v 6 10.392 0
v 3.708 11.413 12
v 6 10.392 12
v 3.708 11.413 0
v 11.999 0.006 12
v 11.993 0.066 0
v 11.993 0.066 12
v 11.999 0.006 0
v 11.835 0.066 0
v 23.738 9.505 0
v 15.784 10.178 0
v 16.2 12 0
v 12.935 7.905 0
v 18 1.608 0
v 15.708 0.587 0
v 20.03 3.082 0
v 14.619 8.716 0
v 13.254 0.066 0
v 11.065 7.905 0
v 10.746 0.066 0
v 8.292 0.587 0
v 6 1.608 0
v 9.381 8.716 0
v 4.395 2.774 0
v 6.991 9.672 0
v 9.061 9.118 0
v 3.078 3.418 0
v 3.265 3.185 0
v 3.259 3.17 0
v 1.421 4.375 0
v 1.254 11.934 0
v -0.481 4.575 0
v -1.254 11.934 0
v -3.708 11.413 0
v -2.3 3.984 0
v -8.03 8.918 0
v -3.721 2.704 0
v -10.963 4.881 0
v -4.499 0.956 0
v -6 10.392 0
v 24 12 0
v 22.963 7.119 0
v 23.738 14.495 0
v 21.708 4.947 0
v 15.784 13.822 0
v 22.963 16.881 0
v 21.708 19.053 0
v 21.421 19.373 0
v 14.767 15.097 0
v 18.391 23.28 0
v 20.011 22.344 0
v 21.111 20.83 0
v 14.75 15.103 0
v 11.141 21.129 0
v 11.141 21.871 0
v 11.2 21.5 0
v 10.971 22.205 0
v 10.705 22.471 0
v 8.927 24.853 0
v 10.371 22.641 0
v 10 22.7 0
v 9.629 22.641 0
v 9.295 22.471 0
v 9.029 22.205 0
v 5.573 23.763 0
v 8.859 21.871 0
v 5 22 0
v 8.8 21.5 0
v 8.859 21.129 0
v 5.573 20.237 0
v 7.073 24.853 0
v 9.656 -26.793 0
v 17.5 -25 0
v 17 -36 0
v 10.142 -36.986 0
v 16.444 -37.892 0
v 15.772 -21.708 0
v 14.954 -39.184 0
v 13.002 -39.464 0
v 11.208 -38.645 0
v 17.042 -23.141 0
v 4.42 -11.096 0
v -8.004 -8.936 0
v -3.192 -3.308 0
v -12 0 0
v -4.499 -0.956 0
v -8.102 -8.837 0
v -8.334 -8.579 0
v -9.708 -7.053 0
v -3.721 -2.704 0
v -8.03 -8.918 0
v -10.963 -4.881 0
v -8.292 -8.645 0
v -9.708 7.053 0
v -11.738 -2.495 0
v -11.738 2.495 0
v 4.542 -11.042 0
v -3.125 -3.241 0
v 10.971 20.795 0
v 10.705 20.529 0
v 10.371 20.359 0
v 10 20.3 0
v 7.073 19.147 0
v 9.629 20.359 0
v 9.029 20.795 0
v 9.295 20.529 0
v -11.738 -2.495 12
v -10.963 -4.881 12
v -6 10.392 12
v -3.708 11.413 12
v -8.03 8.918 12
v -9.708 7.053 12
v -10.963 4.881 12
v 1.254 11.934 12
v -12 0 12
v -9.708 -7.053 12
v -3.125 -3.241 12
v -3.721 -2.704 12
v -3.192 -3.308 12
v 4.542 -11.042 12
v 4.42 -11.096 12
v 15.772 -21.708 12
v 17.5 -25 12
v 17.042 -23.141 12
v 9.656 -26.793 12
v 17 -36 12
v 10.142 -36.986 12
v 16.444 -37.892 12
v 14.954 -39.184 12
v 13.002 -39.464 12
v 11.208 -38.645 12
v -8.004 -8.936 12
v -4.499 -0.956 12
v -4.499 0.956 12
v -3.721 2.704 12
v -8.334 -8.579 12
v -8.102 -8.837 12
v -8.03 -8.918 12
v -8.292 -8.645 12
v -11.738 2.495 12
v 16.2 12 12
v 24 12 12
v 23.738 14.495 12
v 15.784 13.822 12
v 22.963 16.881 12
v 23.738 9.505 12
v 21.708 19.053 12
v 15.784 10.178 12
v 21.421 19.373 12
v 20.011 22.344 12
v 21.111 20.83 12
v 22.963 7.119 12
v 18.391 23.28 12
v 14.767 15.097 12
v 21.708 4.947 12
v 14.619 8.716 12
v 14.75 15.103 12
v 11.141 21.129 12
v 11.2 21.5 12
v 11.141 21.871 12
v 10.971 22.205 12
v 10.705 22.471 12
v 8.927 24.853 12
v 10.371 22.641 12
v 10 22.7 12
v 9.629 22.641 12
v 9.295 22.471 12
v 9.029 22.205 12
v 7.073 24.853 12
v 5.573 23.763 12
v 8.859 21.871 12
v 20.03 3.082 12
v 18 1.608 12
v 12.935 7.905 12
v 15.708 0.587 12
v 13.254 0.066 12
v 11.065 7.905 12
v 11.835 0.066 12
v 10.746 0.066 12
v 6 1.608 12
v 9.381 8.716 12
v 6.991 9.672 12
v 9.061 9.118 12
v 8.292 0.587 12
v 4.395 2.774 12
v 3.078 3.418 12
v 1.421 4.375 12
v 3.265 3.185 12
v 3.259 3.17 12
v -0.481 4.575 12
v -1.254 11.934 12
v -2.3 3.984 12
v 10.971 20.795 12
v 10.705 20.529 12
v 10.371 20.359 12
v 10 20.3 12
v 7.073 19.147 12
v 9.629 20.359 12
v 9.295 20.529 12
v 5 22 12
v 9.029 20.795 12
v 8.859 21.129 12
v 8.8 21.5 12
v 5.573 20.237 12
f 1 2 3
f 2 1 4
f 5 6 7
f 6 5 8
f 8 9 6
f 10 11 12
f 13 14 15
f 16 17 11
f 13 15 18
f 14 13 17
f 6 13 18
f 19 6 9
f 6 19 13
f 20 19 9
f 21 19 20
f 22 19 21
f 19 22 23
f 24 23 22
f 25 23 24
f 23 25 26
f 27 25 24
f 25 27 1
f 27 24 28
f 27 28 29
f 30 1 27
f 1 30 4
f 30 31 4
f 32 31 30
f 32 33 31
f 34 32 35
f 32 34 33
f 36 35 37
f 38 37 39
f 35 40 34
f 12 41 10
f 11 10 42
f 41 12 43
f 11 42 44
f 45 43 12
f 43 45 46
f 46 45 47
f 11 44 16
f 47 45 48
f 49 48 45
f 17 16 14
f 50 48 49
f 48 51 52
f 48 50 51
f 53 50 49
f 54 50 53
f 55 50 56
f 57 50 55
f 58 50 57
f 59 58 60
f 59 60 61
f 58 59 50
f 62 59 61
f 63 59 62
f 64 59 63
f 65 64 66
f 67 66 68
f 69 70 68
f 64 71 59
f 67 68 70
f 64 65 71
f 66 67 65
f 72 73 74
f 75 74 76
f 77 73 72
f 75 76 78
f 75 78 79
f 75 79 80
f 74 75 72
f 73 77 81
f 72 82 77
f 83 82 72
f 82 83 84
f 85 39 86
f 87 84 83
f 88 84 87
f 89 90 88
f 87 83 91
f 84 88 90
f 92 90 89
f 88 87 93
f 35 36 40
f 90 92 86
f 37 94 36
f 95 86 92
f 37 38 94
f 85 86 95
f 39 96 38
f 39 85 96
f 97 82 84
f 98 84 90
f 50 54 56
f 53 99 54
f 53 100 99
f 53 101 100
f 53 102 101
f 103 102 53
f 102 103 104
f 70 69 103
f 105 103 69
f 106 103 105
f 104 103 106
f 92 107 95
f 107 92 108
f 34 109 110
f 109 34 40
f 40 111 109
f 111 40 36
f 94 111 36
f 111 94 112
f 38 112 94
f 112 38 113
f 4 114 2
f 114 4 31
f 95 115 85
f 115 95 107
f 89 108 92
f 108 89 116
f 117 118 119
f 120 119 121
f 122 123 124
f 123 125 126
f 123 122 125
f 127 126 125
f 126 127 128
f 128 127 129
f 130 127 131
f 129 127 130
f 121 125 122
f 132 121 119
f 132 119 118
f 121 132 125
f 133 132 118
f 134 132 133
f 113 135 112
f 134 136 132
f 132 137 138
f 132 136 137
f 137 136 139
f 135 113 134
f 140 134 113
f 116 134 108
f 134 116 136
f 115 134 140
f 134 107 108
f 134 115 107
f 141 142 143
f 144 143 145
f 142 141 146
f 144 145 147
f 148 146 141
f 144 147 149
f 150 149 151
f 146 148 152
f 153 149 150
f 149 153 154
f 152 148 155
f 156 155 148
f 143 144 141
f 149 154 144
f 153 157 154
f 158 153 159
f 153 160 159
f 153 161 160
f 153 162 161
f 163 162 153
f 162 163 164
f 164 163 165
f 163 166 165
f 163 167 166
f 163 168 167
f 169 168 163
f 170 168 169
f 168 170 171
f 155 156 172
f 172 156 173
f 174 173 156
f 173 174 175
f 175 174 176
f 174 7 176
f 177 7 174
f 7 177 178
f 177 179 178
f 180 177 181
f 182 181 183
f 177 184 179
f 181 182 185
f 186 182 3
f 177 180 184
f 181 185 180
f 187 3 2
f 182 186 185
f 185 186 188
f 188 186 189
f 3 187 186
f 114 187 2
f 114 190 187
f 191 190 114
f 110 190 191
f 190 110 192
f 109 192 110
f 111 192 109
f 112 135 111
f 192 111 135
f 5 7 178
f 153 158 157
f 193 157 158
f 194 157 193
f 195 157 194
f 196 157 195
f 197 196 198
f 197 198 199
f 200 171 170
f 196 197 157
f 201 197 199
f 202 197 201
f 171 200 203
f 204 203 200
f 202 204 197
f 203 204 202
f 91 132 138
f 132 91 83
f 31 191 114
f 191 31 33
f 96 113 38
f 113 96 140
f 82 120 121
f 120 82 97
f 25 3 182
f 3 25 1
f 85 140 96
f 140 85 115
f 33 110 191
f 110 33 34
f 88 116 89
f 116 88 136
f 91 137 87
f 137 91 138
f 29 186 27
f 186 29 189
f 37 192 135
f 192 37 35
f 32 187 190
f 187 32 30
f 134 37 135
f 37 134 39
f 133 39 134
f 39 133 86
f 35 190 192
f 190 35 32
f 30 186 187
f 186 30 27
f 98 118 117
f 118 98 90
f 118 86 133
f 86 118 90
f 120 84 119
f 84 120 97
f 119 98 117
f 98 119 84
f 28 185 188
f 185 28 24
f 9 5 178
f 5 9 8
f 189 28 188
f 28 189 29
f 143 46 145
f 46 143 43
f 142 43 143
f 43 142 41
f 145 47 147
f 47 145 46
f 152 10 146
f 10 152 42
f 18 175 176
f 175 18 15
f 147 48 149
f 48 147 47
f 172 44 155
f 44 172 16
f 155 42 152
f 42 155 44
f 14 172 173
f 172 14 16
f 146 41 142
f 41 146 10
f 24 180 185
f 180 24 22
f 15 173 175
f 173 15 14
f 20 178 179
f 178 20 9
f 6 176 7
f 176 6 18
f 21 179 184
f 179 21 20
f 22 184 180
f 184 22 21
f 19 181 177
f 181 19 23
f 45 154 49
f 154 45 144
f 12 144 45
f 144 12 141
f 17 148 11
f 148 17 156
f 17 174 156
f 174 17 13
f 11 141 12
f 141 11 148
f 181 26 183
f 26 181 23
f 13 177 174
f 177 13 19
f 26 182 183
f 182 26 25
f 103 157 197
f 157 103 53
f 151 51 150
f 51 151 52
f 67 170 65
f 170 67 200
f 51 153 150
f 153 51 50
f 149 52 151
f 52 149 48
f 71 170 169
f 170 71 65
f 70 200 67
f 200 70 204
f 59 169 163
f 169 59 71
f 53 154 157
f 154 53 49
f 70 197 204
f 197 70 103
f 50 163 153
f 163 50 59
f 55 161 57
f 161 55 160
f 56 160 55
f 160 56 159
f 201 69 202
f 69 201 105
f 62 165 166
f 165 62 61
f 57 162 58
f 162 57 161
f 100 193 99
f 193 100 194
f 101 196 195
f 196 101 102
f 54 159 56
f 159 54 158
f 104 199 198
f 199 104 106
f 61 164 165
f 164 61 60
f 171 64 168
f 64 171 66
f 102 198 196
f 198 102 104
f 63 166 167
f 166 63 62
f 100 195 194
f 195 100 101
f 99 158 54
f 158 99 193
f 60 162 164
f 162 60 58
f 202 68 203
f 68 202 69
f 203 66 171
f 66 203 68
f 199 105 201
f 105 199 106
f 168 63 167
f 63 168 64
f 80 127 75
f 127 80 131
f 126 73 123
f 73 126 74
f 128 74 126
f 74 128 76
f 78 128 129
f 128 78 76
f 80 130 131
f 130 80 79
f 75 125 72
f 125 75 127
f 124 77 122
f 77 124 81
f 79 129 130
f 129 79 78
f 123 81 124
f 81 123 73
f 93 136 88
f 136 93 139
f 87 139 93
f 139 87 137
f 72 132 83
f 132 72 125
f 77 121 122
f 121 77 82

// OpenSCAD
// ShipsBoatA
// Parts to mate fiberglass pole onto bike rack
// Fiberglass 8 mm diameter
// Bikerack 8.4 mm, more like 9 near bends

// Back
H=12.0;      // height to extrude

difference(){
    cylinder(r=12,h=H);
    cylinder(r=4.6,h=H);

    color("pink")    
    translate([6,-12.5,0]) rotate([0,0,45])
    linear_extrude(height=H+0.1) square(size=[8,13]);

    color("cyan")    
    translate([13,-11,0]) rotate([0,0,70])
    linear_extrude(height=H+0.1) square(size=[10,14]);
}


translate([12,12,0])
difference(){
    cylinder(r=12,h=H);
    cylinder(r=4.2,h=H);

    color("orange")    
    translate([8-11,7-9.5,0]) rotate([0,0,45])
    linear_extrude(height=H+0.1) square(size=[16,12]);

    color("purple")    
    translate([8.5-11,6-9,0]) rotate([0,0,75])
    linear_extrude(height=H+0.1) square(size=[6,13]);
}

    hull(){
        color("red")    
        translate([10+3.5,-36,0]) 
        cylinder(r=3.5,h=H);

        color("red")    
        translate([10+3.5,-25,0]) 
        cylinder(r=4,h=H);
    }
    
    hull(){
        color("red")    
        translate([10+3.5,-25,0]) 
        cylinder(r=4,h=H);

        color("red")    
        translate([-6,-6,0]) 
        cylinder(r=3.5,h=H);
    }

    difference(){
    hull(){
        color("red")    
        translate([8,22,0]) 
        cylinder(r=3.0,h=H);

        color("red")    
        translate([17,19,0]) 
        cylinder(r=4.5,h=H);
    }
        translate([10,21.5,0]) 
        cylinder(r=1.2,h=H,$fn=20);
}
    
